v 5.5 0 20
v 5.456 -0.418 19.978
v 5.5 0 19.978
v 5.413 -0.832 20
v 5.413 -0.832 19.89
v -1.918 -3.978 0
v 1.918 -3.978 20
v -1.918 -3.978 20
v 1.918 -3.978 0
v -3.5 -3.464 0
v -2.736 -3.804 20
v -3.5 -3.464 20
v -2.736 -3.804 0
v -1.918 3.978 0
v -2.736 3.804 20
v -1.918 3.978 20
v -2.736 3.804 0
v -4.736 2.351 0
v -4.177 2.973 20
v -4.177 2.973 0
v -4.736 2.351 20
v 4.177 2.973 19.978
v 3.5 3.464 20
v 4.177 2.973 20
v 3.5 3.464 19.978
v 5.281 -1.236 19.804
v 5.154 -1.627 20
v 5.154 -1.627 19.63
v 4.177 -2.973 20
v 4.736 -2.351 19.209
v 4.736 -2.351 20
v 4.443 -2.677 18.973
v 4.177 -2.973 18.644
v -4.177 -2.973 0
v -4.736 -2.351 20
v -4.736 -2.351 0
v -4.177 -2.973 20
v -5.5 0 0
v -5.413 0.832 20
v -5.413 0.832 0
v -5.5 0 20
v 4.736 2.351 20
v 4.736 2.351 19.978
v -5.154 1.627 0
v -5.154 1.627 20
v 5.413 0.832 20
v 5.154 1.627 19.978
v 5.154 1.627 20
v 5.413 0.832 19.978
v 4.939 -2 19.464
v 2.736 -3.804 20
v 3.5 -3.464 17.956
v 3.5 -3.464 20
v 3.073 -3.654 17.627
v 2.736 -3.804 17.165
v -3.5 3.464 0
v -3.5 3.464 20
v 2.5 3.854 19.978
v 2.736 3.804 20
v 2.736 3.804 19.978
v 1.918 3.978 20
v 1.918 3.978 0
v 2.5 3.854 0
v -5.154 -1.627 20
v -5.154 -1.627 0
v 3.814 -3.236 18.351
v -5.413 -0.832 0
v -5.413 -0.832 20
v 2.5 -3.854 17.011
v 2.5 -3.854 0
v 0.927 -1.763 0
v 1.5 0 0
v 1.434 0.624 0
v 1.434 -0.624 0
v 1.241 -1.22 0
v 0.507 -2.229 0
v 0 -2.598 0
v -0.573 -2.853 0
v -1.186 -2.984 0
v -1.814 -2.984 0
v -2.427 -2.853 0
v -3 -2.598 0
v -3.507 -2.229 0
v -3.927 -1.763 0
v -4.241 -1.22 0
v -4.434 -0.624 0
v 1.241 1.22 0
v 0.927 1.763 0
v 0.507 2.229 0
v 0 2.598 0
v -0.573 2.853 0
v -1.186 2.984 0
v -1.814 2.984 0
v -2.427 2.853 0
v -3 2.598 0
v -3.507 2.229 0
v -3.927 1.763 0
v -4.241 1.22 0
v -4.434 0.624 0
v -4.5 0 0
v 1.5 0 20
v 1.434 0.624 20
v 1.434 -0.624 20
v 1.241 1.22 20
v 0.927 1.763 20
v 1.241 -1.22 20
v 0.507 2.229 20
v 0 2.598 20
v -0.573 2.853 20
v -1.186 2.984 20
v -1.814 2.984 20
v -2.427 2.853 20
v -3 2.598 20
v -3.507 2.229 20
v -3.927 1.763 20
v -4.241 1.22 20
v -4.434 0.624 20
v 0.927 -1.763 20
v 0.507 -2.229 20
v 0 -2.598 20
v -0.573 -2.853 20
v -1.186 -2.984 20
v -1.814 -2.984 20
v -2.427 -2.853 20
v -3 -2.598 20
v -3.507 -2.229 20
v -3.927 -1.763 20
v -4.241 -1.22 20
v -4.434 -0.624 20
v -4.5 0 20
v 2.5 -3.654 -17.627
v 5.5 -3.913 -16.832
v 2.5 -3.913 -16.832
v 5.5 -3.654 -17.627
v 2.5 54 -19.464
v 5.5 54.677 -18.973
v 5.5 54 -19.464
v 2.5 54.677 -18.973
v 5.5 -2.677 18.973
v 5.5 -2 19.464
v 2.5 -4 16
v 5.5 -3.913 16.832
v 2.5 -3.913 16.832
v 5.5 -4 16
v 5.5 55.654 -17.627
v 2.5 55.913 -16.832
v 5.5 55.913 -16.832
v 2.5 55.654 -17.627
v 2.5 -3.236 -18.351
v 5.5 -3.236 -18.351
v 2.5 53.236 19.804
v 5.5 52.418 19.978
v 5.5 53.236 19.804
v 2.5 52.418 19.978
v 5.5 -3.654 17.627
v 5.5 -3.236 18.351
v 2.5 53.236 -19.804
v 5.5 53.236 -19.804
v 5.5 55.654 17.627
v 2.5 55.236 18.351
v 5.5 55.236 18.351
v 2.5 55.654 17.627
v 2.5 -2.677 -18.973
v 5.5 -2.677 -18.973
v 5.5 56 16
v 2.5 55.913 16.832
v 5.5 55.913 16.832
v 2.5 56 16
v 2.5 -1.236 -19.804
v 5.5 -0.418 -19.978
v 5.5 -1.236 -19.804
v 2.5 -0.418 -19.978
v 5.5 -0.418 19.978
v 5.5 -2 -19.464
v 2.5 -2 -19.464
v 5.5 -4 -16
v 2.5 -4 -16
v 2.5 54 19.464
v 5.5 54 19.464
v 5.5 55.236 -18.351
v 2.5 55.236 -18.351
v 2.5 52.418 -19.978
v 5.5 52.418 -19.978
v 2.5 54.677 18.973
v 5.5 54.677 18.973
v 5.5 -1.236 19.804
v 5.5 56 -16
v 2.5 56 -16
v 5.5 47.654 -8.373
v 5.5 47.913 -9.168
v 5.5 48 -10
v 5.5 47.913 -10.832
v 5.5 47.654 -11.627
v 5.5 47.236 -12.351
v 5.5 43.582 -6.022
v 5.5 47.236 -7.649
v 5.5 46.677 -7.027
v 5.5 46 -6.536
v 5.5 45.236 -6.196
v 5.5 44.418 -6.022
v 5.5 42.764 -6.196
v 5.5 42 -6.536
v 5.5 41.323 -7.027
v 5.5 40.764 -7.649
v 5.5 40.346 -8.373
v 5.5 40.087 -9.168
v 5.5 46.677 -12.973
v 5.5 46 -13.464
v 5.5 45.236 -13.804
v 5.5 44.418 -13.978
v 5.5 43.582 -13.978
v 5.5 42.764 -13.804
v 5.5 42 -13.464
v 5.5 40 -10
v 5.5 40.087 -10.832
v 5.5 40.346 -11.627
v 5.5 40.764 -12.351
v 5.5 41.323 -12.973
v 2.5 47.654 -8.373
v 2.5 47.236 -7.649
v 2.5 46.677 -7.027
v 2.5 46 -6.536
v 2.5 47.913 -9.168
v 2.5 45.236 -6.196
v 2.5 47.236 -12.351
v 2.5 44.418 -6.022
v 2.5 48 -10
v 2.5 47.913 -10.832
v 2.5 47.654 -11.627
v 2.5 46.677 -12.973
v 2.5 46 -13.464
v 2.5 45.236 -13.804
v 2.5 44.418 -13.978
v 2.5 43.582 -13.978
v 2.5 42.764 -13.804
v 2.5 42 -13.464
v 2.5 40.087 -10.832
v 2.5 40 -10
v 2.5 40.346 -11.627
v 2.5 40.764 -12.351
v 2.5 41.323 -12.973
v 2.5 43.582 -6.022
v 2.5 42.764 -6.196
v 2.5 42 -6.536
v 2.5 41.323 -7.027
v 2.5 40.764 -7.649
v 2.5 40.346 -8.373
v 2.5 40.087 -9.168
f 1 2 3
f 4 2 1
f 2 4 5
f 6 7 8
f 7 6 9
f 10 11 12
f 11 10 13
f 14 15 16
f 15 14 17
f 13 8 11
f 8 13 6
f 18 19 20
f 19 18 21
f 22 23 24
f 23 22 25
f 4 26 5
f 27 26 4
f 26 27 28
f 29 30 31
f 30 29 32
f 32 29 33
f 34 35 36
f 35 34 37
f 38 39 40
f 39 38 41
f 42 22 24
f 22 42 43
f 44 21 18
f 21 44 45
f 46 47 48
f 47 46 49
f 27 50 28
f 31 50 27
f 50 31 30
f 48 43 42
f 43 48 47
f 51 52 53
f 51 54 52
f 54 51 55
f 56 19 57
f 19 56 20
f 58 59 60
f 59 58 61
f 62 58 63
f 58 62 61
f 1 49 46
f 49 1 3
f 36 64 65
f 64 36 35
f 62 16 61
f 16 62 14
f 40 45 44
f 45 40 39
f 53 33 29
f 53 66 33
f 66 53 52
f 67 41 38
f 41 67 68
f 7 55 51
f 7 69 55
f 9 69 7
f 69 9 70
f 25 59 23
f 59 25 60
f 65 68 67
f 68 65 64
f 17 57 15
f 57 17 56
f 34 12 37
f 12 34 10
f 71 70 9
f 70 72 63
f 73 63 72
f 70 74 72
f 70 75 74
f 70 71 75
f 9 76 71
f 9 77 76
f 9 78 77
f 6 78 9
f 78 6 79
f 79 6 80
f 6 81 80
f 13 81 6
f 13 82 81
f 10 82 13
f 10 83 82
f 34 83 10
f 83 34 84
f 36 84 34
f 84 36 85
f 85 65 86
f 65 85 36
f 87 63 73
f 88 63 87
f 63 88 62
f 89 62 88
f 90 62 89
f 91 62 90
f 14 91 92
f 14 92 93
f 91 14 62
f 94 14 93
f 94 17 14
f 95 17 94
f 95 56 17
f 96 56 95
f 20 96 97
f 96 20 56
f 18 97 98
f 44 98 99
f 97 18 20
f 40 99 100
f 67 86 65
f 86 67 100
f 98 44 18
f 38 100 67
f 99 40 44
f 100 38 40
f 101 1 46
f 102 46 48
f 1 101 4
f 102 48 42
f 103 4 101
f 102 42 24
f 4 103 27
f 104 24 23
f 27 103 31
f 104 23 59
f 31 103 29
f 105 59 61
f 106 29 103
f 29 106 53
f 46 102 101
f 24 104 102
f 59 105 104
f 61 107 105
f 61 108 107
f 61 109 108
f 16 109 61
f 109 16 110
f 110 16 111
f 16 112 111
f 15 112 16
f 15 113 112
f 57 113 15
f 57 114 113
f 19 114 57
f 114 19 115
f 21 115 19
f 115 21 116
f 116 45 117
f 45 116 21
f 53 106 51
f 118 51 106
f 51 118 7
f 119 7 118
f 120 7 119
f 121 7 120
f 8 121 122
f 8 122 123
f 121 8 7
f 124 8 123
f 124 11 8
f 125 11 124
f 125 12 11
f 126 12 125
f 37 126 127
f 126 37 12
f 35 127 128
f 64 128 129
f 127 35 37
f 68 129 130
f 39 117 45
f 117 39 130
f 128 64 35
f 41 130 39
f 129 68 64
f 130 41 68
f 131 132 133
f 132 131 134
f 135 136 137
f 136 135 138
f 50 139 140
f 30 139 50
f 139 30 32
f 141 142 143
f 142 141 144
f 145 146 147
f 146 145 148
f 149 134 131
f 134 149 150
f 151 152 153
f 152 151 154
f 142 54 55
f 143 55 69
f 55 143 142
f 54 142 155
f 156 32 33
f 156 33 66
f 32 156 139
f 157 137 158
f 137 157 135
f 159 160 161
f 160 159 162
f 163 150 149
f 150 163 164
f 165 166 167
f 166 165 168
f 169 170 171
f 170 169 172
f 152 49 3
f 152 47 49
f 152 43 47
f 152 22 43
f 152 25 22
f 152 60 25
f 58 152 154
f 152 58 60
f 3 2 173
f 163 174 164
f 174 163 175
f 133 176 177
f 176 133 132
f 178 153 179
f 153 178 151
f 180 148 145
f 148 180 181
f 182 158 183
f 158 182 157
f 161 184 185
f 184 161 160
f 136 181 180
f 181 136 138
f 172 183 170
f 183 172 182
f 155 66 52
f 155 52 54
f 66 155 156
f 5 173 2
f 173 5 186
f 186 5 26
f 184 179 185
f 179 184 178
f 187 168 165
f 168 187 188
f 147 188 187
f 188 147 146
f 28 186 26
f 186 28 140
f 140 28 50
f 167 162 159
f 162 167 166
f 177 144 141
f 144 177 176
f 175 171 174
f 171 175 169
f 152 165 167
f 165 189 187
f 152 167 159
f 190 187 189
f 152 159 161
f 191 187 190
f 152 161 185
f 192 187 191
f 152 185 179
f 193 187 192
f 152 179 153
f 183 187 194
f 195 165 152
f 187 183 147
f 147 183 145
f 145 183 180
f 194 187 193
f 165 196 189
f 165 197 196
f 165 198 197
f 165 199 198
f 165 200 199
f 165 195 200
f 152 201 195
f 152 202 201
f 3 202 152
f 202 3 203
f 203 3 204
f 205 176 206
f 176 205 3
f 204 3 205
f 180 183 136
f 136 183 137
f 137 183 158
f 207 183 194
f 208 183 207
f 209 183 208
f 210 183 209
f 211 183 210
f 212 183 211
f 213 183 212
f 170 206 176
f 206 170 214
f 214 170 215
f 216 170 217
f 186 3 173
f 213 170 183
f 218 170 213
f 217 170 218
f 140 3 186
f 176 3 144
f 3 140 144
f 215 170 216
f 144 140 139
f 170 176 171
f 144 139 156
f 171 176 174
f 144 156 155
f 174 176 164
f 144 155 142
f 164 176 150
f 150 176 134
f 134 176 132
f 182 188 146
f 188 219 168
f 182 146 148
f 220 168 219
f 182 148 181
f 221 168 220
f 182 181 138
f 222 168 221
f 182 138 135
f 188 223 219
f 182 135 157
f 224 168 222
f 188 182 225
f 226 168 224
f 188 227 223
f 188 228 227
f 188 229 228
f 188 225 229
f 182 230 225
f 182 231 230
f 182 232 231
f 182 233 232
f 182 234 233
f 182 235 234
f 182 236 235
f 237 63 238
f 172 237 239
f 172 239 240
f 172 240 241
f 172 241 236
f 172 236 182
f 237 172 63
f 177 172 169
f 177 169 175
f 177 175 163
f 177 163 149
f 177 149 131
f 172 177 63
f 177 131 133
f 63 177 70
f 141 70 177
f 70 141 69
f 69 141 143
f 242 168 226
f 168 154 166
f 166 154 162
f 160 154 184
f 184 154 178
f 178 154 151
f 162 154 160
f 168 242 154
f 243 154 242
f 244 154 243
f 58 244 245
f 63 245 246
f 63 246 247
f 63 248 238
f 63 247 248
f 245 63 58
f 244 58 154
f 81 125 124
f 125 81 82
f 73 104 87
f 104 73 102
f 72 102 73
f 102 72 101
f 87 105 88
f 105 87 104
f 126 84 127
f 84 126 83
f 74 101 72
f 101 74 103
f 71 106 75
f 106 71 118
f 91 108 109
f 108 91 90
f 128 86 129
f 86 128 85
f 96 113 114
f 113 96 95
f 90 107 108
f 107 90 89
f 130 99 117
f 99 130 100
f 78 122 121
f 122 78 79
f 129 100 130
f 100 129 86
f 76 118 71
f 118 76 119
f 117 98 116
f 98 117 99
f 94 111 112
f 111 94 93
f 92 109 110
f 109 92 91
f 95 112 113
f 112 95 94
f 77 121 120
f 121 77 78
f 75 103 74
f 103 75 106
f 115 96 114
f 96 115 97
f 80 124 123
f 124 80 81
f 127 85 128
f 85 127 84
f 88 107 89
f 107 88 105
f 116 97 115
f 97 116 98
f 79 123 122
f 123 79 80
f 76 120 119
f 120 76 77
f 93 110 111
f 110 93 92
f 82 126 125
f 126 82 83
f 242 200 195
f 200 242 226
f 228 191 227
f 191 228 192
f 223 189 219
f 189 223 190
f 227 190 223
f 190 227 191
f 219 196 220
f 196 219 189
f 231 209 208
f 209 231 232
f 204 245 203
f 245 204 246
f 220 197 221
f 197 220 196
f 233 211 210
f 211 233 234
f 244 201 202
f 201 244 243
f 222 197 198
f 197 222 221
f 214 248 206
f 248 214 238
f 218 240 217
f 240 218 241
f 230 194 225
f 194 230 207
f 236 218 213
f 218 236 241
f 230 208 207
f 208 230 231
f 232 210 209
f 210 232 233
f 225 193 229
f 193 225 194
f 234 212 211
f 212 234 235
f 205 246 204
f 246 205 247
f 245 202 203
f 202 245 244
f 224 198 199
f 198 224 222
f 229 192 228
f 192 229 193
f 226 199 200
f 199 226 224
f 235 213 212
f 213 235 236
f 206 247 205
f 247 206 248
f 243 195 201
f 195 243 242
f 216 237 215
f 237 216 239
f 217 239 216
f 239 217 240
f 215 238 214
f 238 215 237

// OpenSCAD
SEGMENT_LENGTH_1 = 80;
SEGMENT_LENGTH_2 = 50;
SEGMENT_WIDTH = 40;
SEGMENT_DIA = 8;
SEGMENT_HOLE_DIA = 6;

FOOT_LENGTH = SEGMENT_WIDTH/2;
FOOT_WIDTH = SEGMENT_WIDTH;
FOOT_THICKNESS = 2;

MOUNT_LENGTH = 60;
MOUNT_WIDTH = SEGMENT_WIDTH;
MOUNT_THICKNESS = 3;
MOUNT_HOLE_DIA = 8;
MOUNT_HOLE_OFFSET_X = 10;
MOUNT_HOLE_OFFSET_Y = 12;

$fn = 30;


module bar(length, width, dia) {
  hull() {
    for(i = [1, -1]) {
      translate([i * (length - dia)/2, 0, 0])
      cylinder(d = dia, h = width);
    }
  }  
}

module rounded_rect(length, width, height, dia) {
  hull() {
    for(i = [1, -1]) {
      translate([0, i * (width - dia)/2, 0])
      bar(length, height, dia);
    }
  }
}

module segment(length) {
  difference() {
    union() {
      bar(length, SEGMENT_WIDTH/2, SEGMENT_DIA);
      translate([0, 0, SEGMENT_WIDTH/2])
      bar(length - 2*SEGMENT_DIA, SEGMENT_WIDTH/2, SEGMENT_DIA);
    }
    for(i = [1, -1]) {
      translate([i * (length - SEGMENT_DIA)/2, 0, 0])
      cylinder(d = SEGMENT_HOLE_DIA, h = SEGMENT_WIDTH/2);
    }
  }
}

module connector() {
  difference() {
    l = 2.5 * SEGMENT_DIA;

    bar(l, SEGMENT_WIDTH/2, SEGMENT_DIA);

    for(i = [1, -1]) {
      translate([i * (l - SEGMENT_DIA)/2, 0, 0])
      cylinder(d = SEGMENT_HOLE_DIA, h = SEGMENT_WIDTH/2);
    }
  }
}

module foot() {
  difference() {
    l = SEGMENT_DIA + FOOT_THICKNESS;
    union() {
      translate([0, 0, -SEGMENT_WIDTH/2])
      bar(l, SEGMENT_WIDTH/2, SEGMENT_DIA);
      translate([l/2 - FOOT_THICKNESS, FOOT_LENGTH/2 - SEGMENT_DIA/2, 0])
      rotate([0, 90, 0])
      rotate([0, 0, 90])
      rounded_rect(FOOT_LENGTH, FOOT_WIDTH, FOOT_THICKNESS, SEGMENT_DIA);
    }
    
    translate([-(l - SEGMENT_DIA)/2, 0, -SEGMENT_WIDTH/2])
    cylinder(d = SEGMENT_HOLE_DIA, h = SEGMENT_WIDTH/2);
  }
}

module other_foot() {
  difference() {
    union() {
      l = 2.5 * SEGMENT_DIA;
      connector();
      translate([l/2, -SEGMENT_DIA/2, 0])
      rotate([90, 0, 0])
      rounded_rect(FOOT_LENGTH, FOOT_WIDTH, FOOT_THICKNESS, SEGMENT_DIA);
    }
  }
}

module mount() {
  difference() {
    l = SEGMENT_DIA + MOUNT_THICKNESS;
    union() {
      bar(l, SEGMENT_WIDTH/2, SEGMENT_DIA);
      translate([l/2 - MOUNT_THICKNESS, MOUNT_LENGTH/2 - SEGMENT_DIA/2, 0])
      rotate([0, 90, 0])
      rotate([0, 0, 90])
      rounded_rect(MOUNT_LENGTH, MOUNT_WIDTH, MOUNT_THICKNESS, SEGMENT_DIA);
    }
    
    translate([-(l - SEGMENT_DIA)/2, 0, 0])
    cylinder(d = SEGMENT_HOLE_DIA, h = SEGMENT_WIDTH/2);
    
    translate([0, MOUNT_LENGTH/2 - MOUNT_HOLE_OFFSET_Y, -MOUNT_HOLE_OFFSET_X])
    translate([l/2 - MOUNT_THICKNESS, MOUNT_LENGTH/2 - SEGMENT_DIA/2, 0])
    rotate([0, 90, 0])
    rotate([0, 0, 90])
    cylinder(d = MOUNT_HOLE_DIA, h = MOUNT_THICKNESS);
  }
}

//segment(SEGMENT_LENGTH_1);
//segment(SEGMENT_LENGTH_2);
//connector();
//foot();
//other_foot();
mount();
